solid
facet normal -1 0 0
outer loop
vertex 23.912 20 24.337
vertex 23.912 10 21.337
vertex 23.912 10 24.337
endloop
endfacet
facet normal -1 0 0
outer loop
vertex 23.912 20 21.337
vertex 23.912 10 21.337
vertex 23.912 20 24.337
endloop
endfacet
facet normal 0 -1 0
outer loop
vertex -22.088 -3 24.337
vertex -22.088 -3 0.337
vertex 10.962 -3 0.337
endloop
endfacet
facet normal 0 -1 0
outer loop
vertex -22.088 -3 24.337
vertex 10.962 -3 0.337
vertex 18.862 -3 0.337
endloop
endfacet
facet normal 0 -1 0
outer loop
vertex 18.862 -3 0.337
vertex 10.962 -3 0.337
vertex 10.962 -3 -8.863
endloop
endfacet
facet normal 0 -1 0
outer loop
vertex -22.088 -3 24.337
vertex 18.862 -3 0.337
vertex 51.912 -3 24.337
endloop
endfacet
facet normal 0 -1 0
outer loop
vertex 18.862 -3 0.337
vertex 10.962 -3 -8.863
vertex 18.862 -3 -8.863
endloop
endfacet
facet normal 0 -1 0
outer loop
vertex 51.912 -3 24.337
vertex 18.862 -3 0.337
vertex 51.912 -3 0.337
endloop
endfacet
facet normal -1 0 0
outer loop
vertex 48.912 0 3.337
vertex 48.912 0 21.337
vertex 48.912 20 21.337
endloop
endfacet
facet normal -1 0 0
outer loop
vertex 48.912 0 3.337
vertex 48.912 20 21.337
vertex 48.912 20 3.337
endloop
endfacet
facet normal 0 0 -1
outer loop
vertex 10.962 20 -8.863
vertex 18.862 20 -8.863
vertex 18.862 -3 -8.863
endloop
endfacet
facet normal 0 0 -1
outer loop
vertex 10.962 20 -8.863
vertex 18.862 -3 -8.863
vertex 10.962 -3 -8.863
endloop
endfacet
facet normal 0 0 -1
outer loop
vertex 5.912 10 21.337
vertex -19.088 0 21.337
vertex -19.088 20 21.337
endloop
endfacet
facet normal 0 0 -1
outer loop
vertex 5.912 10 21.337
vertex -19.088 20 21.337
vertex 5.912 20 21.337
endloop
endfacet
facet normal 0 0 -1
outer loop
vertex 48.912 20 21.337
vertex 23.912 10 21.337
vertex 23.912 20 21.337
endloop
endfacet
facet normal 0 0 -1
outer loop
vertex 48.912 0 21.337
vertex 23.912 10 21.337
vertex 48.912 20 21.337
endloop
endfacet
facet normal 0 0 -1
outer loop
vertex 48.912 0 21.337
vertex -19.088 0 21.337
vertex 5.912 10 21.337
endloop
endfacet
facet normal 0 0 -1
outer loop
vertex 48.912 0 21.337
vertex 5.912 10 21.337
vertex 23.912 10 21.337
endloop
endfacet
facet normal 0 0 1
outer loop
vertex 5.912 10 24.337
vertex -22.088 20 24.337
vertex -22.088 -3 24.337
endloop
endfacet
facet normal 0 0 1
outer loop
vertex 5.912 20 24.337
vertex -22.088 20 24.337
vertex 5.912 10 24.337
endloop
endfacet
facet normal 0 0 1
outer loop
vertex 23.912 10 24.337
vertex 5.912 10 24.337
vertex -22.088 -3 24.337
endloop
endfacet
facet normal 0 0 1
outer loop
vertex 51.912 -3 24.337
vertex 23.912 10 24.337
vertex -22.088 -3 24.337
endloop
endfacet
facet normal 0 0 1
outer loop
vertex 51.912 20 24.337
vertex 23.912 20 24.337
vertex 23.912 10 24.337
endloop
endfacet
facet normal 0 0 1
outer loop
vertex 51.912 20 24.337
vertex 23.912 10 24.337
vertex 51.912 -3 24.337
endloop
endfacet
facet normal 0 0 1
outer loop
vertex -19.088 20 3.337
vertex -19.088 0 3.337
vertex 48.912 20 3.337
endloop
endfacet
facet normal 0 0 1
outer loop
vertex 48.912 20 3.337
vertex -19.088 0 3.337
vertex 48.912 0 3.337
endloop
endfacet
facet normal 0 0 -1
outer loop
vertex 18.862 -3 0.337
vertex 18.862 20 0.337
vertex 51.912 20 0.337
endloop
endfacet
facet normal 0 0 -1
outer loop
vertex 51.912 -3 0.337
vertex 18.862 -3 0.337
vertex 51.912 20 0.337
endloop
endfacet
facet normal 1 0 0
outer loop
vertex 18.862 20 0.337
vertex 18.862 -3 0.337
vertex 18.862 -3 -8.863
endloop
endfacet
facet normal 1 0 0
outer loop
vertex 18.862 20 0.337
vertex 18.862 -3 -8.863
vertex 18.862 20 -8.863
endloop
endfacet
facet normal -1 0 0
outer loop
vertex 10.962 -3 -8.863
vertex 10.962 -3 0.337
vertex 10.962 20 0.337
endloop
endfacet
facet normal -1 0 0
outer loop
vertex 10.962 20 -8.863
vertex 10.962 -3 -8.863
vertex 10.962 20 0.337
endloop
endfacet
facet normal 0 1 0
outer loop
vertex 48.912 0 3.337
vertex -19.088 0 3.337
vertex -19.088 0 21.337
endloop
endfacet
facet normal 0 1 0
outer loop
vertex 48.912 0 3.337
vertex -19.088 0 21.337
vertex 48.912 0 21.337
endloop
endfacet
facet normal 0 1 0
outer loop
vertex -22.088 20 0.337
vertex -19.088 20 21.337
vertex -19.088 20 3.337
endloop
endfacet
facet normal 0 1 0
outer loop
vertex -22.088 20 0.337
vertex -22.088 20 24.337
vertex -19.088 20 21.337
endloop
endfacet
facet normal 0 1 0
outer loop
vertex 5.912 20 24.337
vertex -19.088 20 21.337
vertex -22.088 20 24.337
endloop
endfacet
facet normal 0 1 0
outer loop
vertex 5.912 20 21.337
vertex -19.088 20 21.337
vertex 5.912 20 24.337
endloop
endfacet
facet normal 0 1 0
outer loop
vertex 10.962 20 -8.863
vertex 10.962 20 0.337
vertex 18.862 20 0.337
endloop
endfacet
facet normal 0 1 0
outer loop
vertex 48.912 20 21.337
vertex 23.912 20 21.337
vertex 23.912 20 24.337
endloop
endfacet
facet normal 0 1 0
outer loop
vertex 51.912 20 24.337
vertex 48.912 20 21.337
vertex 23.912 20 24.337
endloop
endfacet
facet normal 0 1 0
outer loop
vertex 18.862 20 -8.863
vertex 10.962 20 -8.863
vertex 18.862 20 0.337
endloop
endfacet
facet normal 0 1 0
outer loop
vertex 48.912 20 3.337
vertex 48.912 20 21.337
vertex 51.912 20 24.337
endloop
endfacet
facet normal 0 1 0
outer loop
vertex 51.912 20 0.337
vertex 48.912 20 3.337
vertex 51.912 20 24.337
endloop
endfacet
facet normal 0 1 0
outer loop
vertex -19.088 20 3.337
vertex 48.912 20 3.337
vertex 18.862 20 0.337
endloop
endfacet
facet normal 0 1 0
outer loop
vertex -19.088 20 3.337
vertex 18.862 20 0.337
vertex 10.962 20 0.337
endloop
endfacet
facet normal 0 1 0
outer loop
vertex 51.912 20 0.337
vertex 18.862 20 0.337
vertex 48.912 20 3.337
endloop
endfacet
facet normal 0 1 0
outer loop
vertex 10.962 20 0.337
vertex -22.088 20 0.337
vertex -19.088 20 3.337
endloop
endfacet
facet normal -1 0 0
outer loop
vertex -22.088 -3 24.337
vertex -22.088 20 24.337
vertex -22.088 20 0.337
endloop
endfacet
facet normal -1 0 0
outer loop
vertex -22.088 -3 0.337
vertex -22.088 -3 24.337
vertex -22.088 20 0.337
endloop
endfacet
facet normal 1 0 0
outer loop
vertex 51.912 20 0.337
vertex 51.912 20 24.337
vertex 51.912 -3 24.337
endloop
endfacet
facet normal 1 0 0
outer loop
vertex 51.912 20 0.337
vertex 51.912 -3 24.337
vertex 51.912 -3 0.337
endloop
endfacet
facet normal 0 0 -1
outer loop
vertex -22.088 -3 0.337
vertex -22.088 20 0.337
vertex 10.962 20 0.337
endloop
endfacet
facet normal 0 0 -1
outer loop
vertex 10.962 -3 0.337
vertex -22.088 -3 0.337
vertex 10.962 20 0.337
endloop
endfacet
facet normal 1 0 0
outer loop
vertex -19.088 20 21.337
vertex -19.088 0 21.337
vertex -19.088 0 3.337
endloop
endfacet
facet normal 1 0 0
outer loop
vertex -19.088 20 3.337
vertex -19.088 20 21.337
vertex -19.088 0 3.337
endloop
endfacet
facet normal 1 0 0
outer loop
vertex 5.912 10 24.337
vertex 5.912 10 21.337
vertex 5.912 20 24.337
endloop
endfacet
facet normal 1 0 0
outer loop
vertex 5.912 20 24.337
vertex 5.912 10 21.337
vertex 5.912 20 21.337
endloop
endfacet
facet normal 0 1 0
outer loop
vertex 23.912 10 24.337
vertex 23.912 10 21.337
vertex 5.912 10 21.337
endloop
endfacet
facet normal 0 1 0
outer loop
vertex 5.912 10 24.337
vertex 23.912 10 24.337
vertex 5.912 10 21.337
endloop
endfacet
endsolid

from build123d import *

# Parameters (mm, degrees)
SKETCH1_W           = 74
SKETCH1_H           = 24
SKETCH1_W_2         = 68
SKETCH1_H_2         = 18
BOSS_EXTRUDE1_DEPTH = 20
SKETCH1_3_W         = 74
SKETCH1_3_H         = 24
BOSS_EXTRUDE2_DEPTH = 3
CUT_EXTRUDE1_REACH  = 61.463
SKETCH4_W           = 18
SKETCH4_H           = 10
SKETCH5_W           = 7.9
SKETCH5_H           = 23
BOSS_EXTRUDE3_DEPTH = 9.2


with BuildPart() as part:
    # Sketch1 → Boss-Extrude1 (new body)
    with BuildSketch(Plane(origin=(0, 0, 0), x_dir=(1, 0, 0), z_dir=(0, 1, 0))):
        with Locations((14.912280702, -12.336842105)):
            Rectangle(SKETCH1_W, SKETCH1_H)
        with Locations((14.912280702, -12.336842105)):
            Rectangle(SKETCH1_W_2, SKETCH1_H_2, mode=Mode.SUBTRACT)
    extrude(amount=BOSS_EXTRUDE1_DEPTH)

    # Sketch1<3> → Boss-Extrude2 (add)
    with BuildSketch(Plane(origin=(0, 0, 0), x_dir=(1, 0, 0), z_dir=(0, 1, 0))):
        with Locations((14.912280702, -12.336842105)):
            Rectangle(SKETCH1_3_W, SKETCH1_3_H)
    extrude(amount=-BOSS_EXTRUDE2_DEPTH)

    # Sketch4 → Cut-Extrude1 (cut, up to next)
    with BuildSketch(Plane(origin=(0, 0, 21.336842105), x_dir=(-1, 0, 0), z_dir=(0, 0, -1)), mode=Mode.PRIVATE) as cut_extrude1_sk1:
        with Locations((-14.912280702, 15)):
            Rectangle(SKETCH4_W, SKETCH4_H)
    cut_extrude1_tool1 = extrude(cut_extrude1_sk1.sketch, amount=-CUT_EXTRUDE1_REACH, mode=Mode.PRIVATE) & part.part
    add(cut_extrude1_tool1.solids().sort_by_distance((14.912281, 15, 21.336842))[0], mode=Mode.SUBTRACT)

    # Sketch5 → Boss-Extrude3 (add)
    with BuildSketch(Plane(origin=(0, 0, 0.336842105), x_dir=(-1, 0, 0), z_dir=(0, 0, -1))):
        with Locations((-14.912280702, 8.5)):
            Rectangle(SKETCH5_W, SKETCH5_H)
    extrude(amount=BOSS_EXTRUDE3_DEPTH)


solid = part.part
